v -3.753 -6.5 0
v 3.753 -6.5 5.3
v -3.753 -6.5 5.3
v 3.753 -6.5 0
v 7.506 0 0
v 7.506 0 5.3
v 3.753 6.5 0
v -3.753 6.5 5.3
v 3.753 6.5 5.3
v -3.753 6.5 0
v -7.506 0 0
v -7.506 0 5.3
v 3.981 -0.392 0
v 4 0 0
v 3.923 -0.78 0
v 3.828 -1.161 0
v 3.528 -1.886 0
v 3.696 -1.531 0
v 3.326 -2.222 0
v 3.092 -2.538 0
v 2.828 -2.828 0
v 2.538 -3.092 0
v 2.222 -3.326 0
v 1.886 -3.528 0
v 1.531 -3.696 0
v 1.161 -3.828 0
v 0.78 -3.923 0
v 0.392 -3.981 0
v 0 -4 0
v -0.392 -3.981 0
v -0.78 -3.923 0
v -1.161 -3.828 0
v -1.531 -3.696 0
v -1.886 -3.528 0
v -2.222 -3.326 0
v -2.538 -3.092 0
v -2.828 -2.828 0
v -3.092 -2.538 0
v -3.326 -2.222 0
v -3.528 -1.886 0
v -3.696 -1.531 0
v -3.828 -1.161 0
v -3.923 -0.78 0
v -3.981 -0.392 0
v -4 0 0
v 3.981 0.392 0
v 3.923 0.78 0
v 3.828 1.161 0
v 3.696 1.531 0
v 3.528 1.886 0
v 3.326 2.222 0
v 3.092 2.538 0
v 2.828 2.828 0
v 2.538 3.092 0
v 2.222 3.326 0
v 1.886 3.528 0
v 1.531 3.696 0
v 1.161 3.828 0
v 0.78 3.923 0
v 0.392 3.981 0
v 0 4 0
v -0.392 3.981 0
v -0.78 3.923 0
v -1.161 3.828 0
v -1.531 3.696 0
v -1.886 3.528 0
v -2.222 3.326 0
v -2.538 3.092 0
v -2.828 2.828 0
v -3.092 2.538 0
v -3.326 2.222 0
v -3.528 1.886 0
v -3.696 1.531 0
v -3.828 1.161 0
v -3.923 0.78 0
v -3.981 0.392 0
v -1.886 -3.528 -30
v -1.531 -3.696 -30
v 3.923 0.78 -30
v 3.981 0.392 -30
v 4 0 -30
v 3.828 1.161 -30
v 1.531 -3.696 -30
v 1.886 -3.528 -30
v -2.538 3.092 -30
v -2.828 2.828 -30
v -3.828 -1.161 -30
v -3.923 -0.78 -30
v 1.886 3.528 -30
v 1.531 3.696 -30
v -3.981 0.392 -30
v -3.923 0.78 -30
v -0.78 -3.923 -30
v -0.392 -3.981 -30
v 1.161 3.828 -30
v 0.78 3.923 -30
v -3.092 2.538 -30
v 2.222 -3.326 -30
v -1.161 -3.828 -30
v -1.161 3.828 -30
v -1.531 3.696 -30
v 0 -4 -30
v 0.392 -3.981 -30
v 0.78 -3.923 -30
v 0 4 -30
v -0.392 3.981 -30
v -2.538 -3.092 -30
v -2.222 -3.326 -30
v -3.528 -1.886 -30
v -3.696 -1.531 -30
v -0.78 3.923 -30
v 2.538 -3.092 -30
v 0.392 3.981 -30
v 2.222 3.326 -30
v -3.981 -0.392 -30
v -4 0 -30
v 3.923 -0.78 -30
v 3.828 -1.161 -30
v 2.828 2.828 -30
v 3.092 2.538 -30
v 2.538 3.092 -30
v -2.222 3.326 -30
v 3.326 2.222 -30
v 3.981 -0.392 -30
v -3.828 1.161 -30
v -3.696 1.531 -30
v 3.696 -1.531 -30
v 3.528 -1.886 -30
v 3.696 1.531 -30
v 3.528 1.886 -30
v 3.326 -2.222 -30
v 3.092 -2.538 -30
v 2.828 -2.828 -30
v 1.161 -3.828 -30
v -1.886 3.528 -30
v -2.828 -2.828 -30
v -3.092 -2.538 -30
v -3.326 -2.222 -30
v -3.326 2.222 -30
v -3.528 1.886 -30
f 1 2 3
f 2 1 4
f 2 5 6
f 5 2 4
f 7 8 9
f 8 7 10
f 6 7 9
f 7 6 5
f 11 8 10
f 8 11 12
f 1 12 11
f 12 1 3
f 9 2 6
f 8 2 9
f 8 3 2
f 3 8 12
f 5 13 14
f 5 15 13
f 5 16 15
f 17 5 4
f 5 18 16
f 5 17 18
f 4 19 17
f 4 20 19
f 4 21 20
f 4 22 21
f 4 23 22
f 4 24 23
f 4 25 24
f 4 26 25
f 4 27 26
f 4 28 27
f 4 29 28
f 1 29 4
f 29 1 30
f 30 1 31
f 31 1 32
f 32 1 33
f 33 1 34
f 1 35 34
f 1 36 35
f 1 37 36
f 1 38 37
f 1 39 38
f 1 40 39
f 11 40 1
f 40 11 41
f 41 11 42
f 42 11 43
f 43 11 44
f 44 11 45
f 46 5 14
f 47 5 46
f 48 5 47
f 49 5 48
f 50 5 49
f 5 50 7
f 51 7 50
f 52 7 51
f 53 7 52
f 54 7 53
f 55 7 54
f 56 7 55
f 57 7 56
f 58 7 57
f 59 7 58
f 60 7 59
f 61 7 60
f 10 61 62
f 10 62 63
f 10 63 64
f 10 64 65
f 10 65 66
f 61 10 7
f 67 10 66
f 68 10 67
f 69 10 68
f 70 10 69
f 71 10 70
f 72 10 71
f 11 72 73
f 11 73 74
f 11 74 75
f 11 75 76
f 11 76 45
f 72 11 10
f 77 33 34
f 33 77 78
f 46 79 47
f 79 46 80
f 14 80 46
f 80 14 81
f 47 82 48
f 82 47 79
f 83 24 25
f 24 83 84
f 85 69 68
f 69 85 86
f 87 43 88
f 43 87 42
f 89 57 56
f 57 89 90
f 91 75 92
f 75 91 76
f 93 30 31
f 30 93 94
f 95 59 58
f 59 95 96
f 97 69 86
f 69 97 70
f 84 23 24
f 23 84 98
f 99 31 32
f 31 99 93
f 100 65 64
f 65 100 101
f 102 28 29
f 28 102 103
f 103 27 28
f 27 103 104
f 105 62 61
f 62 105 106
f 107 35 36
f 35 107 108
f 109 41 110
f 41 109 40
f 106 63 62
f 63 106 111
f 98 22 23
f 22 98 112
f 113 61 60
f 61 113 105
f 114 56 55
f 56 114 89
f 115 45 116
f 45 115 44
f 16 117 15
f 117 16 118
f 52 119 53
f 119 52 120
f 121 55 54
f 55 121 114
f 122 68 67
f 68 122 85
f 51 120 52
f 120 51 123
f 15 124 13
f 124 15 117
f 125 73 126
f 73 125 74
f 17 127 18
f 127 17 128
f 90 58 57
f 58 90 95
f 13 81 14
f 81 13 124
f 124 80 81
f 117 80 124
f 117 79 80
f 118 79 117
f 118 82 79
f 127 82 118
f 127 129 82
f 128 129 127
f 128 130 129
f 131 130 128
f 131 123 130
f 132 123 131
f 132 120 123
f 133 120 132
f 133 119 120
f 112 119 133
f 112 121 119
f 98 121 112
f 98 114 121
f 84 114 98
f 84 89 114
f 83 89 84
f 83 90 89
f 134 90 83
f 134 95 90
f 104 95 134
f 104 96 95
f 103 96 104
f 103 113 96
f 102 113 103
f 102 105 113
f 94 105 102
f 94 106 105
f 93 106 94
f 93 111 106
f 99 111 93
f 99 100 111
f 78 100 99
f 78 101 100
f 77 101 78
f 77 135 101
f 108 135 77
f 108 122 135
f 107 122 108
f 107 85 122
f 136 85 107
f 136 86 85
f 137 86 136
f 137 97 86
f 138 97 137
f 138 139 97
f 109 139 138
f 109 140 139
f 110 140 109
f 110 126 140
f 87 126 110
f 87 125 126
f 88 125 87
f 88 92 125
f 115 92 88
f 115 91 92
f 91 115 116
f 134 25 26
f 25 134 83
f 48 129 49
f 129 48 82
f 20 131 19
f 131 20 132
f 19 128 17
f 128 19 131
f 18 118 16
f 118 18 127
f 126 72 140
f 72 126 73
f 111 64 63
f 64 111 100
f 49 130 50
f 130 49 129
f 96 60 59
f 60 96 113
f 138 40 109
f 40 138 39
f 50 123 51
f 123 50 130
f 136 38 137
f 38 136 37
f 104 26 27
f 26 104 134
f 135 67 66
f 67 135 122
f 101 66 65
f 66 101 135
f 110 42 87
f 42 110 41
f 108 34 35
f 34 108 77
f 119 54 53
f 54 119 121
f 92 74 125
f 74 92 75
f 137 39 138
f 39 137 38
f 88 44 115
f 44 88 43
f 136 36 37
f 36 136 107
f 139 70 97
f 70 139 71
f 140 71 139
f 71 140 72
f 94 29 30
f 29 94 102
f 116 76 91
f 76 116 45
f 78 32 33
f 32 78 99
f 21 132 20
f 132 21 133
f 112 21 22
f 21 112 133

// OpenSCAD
// M8 六角ボルト（ねじ山省略）

across_flats = 13;
head_height  = 5.3;
shank_diameter = 8;
shank_length   = 30;

module m8_hex_bolt() {
    union() {
        // 頭部：底面 z=0、+Z 方向へ高さ 5.3 mm
        cylinder(
            h = head_height,
            r = across_flats / sqrt(3),
            $fn = 6
        );

        // シャンク：頭部底面から -Z 方向へ 30 mm
        translate([0, 0, -shank_length])
            cylinder(
                h = shank_length,
                d = shank_diameter,
                $fn = 64
            );
    }
}

m8_hex_bolt();
